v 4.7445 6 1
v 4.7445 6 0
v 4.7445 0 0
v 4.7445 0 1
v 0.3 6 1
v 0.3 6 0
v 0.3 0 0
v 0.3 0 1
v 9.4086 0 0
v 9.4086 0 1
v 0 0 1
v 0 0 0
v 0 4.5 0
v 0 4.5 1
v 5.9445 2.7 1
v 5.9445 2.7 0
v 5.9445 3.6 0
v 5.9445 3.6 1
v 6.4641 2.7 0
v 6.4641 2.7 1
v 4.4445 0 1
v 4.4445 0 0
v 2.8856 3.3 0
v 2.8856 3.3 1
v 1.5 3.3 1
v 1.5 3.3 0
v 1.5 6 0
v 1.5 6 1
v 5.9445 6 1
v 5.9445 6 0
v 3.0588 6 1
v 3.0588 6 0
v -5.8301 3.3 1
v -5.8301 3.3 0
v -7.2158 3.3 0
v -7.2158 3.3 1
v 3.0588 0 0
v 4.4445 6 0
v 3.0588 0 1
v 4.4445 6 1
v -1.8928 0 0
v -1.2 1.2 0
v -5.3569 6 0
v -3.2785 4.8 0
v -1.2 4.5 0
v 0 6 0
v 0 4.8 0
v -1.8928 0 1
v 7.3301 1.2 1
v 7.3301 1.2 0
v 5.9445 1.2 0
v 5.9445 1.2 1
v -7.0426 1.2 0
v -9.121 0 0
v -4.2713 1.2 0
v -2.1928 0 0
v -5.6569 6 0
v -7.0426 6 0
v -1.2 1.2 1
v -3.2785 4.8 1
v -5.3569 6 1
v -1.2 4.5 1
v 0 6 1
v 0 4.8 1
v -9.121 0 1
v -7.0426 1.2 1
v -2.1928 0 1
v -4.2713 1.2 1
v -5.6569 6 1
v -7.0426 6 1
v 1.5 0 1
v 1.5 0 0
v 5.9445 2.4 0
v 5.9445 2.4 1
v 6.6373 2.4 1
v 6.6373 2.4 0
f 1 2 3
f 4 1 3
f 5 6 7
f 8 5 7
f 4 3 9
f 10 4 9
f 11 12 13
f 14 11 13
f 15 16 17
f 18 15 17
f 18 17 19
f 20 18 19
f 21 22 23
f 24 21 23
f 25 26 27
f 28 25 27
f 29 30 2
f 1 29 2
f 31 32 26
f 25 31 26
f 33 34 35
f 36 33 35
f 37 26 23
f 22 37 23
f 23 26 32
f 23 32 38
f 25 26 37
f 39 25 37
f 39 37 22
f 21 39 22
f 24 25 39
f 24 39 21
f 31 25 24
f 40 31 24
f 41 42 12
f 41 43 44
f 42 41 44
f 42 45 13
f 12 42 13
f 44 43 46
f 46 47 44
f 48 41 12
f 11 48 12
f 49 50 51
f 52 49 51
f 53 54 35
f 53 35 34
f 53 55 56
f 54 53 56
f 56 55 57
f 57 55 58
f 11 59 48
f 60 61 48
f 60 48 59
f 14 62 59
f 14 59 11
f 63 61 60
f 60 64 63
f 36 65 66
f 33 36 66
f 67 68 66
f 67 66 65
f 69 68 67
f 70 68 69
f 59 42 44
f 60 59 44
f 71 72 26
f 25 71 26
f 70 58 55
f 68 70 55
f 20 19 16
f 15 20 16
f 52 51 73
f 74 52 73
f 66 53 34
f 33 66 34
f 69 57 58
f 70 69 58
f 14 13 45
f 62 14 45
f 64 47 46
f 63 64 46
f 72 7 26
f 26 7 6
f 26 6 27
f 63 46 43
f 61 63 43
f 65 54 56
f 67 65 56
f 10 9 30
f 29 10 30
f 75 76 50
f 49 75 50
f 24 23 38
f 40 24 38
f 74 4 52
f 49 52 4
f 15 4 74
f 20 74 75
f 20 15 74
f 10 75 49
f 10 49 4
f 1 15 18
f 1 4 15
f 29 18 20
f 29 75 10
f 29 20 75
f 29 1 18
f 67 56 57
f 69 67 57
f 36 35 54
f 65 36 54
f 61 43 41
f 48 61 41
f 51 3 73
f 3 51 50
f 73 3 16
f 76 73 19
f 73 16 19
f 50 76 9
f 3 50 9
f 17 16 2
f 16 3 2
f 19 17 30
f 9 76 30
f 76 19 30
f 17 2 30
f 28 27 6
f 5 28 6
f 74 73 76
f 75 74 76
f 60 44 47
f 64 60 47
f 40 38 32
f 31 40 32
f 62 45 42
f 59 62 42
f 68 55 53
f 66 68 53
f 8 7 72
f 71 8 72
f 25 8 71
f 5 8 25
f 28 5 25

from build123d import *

# Parameters (mm, degrees)
F1_DEPTH = 1


with BuildPart() as f1:
    # F0 (on Top) → F1 (new body)
    with BuildSketch(Plane.XY):
        Polygon((-5.656922, 6), (-7.042563, 6), (-4.271281, 1.2), (-7.042563, 1.2), (-5.830127, 3.3), (-7.215768, 3.3), (-9.121024, 0), (-2.19282, 0), align=None)
        Polygon((0, 6), (-5.356922, 6), (-1.89282, 0), (0, 0), (0, 4.5), (-1.2, 4.5), (-1.2, 1.2), (-3.278461, 4.8), (0, 4.8), align=None)
        Polygon((1.5, 6), (0.3, 6), (0.3, 0), (1.5, 0), (1.5, 3.3), align=None)
        Polygon((3.058846, 6), (1.5, 3.3), (3.058846, 0), (4.444486, 0), (2.885641, 3.3), (4.444486, 6), align=None)
        Polygon((5.944486, 6), (4.744486, 6), (4.744486, 0), (9.408588, 0), align=None)
        Polygon((5.944486, 1.2), (5.944486, 2.4), (6.637307, 2.4), (7.330127, 1.2), align=None, mode=Mode.SUBTRACT)
        Polygon((5.944486, 2.7), (5.944486, 3.6), (6.464102, 2.7), align=None, mode=Mode.SUBTRACT)
    extrude(amount=F1_DEPTH)


solid = f1.part
